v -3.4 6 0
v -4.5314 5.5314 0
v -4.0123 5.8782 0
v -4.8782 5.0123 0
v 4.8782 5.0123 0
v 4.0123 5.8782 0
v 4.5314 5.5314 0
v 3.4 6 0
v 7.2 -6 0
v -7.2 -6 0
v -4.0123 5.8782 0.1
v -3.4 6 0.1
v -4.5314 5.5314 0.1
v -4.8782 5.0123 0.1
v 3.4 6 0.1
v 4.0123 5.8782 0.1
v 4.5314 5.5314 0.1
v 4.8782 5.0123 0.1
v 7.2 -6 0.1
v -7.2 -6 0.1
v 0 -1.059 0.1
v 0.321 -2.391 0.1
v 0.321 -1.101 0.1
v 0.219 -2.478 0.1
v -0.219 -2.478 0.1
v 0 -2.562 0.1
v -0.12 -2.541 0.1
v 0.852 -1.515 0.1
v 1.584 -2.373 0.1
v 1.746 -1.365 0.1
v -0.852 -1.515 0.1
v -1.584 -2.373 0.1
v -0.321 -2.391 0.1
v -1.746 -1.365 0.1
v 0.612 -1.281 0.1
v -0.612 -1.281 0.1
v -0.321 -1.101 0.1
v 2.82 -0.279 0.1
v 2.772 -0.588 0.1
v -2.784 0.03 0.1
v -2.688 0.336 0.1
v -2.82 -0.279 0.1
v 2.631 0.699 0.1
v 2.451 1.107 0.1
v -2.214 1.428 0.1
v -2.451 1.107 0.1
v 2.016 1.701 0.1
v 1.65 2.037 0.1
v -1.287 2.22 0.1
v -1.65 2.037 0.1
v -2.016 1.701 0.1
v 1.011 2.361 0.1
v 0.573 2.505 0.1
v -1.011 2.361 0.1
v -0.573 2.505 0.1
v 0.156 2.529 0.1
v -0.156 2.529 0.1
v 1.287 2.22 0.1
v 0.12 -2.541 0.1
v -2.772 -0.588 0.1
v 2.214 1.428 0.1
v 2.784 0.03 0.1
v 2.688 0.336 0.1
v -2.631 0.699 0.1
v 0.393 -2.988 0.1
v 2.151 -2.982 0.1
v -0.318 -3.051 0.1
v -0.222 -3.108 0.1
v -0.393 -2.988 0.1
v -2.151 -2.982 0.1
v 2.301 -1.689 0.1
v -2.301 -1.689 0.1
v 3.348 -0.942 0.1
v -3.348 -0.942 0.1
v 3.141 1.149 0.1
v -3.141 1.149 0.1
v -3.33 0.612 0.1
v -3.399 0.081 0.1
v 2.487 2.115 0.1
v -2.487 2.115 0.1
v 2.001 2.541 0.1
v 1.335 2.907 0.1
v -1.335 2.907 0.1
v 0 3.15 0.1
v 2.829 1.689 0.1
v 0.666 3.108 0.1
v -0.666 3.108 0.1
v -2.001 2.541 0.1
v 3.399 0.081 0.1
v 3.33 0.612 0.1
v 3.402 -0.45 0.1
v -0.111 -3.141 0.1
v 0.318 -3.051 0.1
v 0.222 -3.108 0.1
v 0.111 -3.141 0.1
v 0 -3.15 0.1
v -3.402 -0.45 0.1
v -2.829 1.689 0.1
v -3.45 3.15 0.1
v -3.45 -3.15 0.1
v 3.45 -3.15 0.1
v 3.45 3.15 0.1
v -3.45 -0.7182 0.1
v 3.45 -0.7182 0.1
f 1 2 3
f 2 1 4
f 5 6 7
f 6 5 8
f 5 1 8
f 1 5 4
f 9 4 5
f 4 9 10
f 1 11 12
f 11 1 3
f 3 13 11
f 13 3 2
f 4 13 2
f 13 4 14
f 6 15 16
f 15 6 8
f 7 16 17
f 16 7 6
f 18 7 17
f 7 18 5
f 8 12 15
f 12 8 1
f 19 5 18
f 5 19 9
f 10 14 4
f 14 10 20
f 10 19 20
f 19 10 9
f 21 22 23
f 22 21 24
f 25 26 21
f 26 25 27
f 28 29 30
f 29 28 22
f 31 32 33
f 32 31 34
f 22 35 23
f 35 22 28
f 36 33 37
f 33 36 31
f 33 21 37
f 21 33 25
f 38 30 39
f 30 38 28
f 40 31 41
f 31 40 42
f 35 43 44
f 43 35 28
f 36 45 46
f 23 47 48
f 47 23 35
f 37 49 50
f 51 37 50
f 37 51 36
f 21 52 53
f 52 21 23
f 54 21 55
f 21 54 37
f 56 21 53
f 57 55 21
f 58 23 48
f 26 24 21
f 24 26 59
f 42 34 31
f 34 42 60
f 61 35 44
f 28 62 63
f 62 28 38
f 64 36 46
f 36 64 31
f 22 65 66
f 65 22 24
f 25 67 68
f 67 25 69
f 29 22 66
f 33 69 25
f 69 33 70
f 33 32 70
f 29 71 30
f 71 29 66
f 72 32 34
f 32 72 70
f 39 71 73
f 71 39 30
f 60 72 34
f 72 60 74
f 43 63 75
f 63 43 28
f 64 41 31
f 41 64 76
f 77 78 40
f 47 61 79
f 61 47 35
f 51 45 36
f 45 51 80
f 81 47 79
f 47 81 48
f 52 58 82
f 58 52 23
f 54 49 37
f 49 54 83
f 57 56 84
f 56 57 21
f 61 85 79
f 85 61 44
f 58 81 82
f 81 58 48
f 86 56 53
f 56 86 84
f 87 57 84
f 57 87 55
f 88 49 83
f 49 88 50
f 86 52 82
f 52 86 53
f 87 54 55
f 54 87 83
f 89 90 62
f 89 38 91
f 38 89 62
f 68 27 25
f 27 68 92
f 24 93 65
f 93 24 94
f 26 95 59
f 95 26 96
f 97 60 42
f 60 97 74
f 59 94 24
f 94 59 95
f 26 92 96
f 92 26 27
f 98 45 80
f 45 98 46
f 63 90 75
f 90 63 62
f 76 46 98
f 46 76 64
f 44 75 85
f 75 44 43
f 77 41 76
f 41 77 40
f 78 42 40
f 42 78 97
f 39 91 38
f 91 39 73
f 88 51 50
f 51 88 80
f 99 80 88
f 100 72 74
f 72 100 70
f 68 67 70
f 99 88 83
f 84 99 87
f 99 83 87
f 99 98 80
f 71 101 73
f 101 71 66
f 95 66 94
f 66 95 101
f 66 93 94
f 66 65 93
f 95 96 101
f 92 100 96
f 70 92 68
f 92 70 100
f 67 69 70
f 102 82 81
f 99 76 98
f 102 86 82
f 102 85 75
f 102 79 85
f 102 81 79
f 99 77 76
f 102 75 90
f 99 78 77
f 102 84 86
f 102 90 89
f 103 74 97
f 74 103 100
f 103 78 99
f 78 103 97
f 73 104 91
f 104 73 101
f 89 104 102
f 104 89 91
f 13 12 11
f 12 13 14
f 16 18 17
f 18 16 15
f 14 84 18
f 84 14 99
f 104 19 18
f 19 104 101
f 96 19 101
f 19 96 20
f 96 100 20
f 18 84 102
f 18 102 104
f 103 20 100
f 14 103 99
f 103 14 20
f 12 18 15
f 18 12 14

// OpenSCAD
// file: ../p/logo-shell-1971-outerbox.scad
use <../lib.scad>
function ldraw_lib__logo_shell_1971_outerbox() = [
// 0 Logo Shell 1971 Outerbox
// 0 Name: logo-shell-1971-outerbox.dat
// 0 Author: Vincent Messenet [Cheenzo]
// 0 !LDRAW_ORG Primitive UPDATE 2023-04
// 0 !LICENSE Licensed under CC BY 4.0 : see CAreadme.txt
// 
// 0 BFC CERTIFY CCW
  [0,"BFC","CERTIFY"],
  [0,"BFC","CCW"],
// 
// 0 !HISTORY 2023-06-28 [Cheenzo] Created based on 3004s60 by J. C. Tchang [tchang]
// 0 !HISTORY 2023-08-25 [OrionP] Official Update 2023-04
// 
// 
// 0 // Shell Logo 1971
// 0 // Size: x = -11.5 to 11.5 y = -10.5 to 10.5 z = 0
// 
// 3 16 -11.5 0 10.5 -8.29 0 7.05 -6.67 0 8.47
  [3,16,-11.5,0,10.5,-8.29,0,7.05,-6.67,0,8.47],
// 4 16 -7.17 0 -9.94 -7.67 0 -5.63 -11.16 0 -3.14 -11.5 0 -10.5
  [4,16,-7.17,0,-9.94,-7.67,0,-5.63,-11.16,0,-3.14,-11.5,0,-10.5],
// 3 16 -.74 0 -10.36 -1.06 0 -10.17 -7.17 0 -9.94
  [3,16,-.74,0,-10.36,-1.06,0,-10.17,-7.17,0,-9.94],
// 3 16 -11.5 0 10.5 -6.67 0 8.47 -4.45 0 9.69
  [3,16,-11.5,0,10.5,-6.67,0,8.47,-4.45,0,9.69],
// 3 16 0 0 10.5 -11.5 0 10.5 -2.22 0 10.36
  [3,16,0,0,10.5,-11.5,0,10.5,-2.22,0,10.36],
// 3 16 -11.5 0 10.5 -4.45 0 9.69 -2.22 0 10.36
  [3,16,-11.5,0,10.5,-4.45,0,9.69,-2.22,0,10.36],
// 3 16 -11.5 0 10.5 -9.43 0 5.63 -8.29 0 7.05
  [3,16,-11.5,0,10.5,-9.43,0,5.63,-8.29,0,7.05],
// 4 16 11.16 0 -3.14 7.67 0 -5.63 7.17 0 -9.94 11.5 0 -10.5
  [4,16,11.16,0,-3.14,7.67,0,-5.63,7.17,0,-9.94,11.5,0,-10.5],
// 4 16 11.5 0 -10.5 7.17 0 -9.94 .74 0 -10.36 .37 0 -10.47
  [4,16,11.5,0,-10.5,7.17,0,-9.94,.74,0,-10.36,.37,0,-10.47],
// 3 16 7.17 0 -9.94 1.06 0 -10.17 .74 0 -10.36
  [3,16,7.17,0,-9.94,1.06,0,-10.17,.74,0,-10.36],
// 3 16 7.17 0 -9.94 1.31 0 -9.96 1.06 0 -10.17
  [3,16,7.17,0,-9.94,1.31,0,-9.96,1.06,0,-10.17],
// 3 16 .37 0 -10.47 0 0 -10.5 11.5 0 -10.5
  [3,16,.37,0,-10.47,0,0,-10.5,11.5,0,-10.5],
// 3 16 -.37 0 -10.47 -11.5 0 -10.5 0 0 -10.5
  [3,16,-.37,0,-10.47,-11.5,0,-10.5,0,0,-10.5],
// 4 16 -.37 0 -10.47 -.74 0 -10.36 -7.17 0 -9.94 -11.5 0 -10.5
  [4,16,-.37,0,-10.47,-.74,0,-10.36,-7.17,0,-9.94,-11.5,0,-10.5],
// 3 16 -1.06 0 -10.17 -1.31 0 -9.96 -7.17 0 -9.94
  [3,16,-1.06,0,-10.17,-1.31,0,-9.96,-7.17,0,-9.94],
// 3 16 11.5 0 10.5 4.45 0 9.69 6.67 0 8.47
  [3,16,11.5,0,10.5,4.45,0,9.69,6.67,0,8.47],
// 3 16 -11.5 0 10.5 -10.47 0 3.83 -9.43 0 5.63
  [3,16,-11.5,0,10.5,-10.47,0,3.83,-9.43,0,5.63],
// 3 16 11.5 0 10.5 2.22 0 10.36 4.45 0 9.69
  [3,16,11.5,0,10.5,2.22,0,10.36,4.45,0,9.69],
// 3 16 11.5 0 10.5 9.43 0 5.63 10.47 0 3.83
  [3,16,11.5,0,10.5,9.43,0,5.63,10.47,0,3.83],
// 3 16 11.5 0 10.5 8.29 0 7.05 9.43 0 5.63
  [3,16,11.5,0,10.5,8.29,0,7.05,9.43,0,5.63],
// 3 16 11.5 0 10.5 6.67 0 8.47 8.29 0 7.05
  [3,16,11.5,0,10.5,6.67,0,8.47,8.29,0,7.05],
// 3 16 -11.5 0 10.5 -11.1 0 2.04 -10.47 0 3.83
  [3,16,-11.5,0,10.5,-11.1,0,2.04,-10.47,0,3.83],
// 3 16 11.5 0 10.5 10.47 0 3.83 11.1 0 2.04
  [3,16,11.5,0,10.5,10.47,0,3.83,11.1,0,2.04],
// 3 16 -11.5 0 10.5 -11.33 0 .27 -11.1 0 2.04
  [3,16,-11.5,0,10.5,-11.33,0,.27,-11.1,0,2.04],
// 3 16 11.5 0 10.5 0 0 10.5 2.22 0 10.36
  [3,16,11.5,0,10.5,0,0,10.5,2.22,0,10.36],
// 3 16 11.5 0 10.5 11.1 0 2.04 11.33 0 .27
  [3,16,11.5,0,10.5,11.1,0,2.04,11.33,0,.27],
// 4 16 -11.16 0 -3.14 -11.34 0 -1.5 -11.5 0 -2.39 -11.5 0 -10.5
  [4,16,-11.16,0,-3.14,-11.34,0,-1.5,-11.5,0,-2.39,-11.5,0,-10.5],
// 4 16 -11.34 0 -1.5 -11.33 0 .27 -11.5 0 10.5 -11.5 0 -2.39
  [4,16,-11.34,0,-1.5,-11.33,0,.27,-11.5,0,10.5,-11.5,0,-2.39],
// 4 16 11.5 0 -2.39 11.34 0 -1.5 11.16 0 -3.14 11.5 0 -10.5
  [4,16,11.5,0,-2.39,11.34,0,-1.5,11.16,0,-3.14,11.5,0,-10.5],
// 4 16 11.5 0 -2.39 11.5 0 10.5 11.33 0 .27 11.34 0 -1.5
  [4,16,11.5,0,-2.39,11.5,0,10.5,11.33,0,.27,11.34,0,-1.5],
];
module ldraw_lib__logo_shell_1971_outerbox(step=0, col=false, unit=2/5, alt=false, line=0.2, solid=!$preview)
    makepoly(ldraw_lib__logo_shell_1971_outerbox(), step=step, col=col, unit=unit, alt=alt, line=line, solid=solid);
ldraw_lib__logo_shell_1971_outerbox(line=0.2);
// file: ../p/3-16cyli.scad
use <../lib.scad>
function ldraw_lib__3_16cyli() = [
// 0 Cylinder 0.1875
// 0 Name: 3-16cyli.dat
// 0 Author: Mark Kennedy [mkennedy]
// 0 !LDRAW_ORG Primitive UPDATE 2005-01
// 0 !LICENSE Licensed under CC BY 4.0 : see CAreadme.txt
// 
// 0 BFC CERTIFY CCW
  [0,"BFC","CERTIFY"],
  [0,"BFC","CCW"],
// 
// 0 !HISTORY 2004-03-02 [PTadmin] Official Update 2004-01
// 0 !HISTORY 2004-12-11 [nielsk] Recreated using Primitive Generator, Edge lines fixed, BFC changed to CCW
// 0 !HISTORY 2005-12-28 [PTadmin] Official Update 2005-01
// 0 !HISTORY 2007-06-24 [PTadmin] Header formatted for Contributor Agreement
// 0 !HISTORY 2008-07-01 [PTadmin] Official Update 2008-01
// 
// 
// 4 16 .9239 1 .3827 .9239 0 .3827 1 0 0 1 1 0
  [4,16,.9239,1,.3827,.9239,0,.3827,1,0,0,1,1,0],
// 4 16 .7071 1 .7071 .7071 0 .7071 .9239 0 .3827 .9239 1 .3827
  [4,16,.7071,1,.7071,.7071,0,.7071,.9239,0,.3827,.9239,1,.3827],
// 4 16 .3827 1 .9239 .3827 0 .9239 .7071 0 .7071 .7071 1 .7071
  [4,16,.3827,1,.9239,.3827,0,.9239,.7071,0,.7071,.7071,1,.7071],
// 5 24 1 1 0 1 0 0 1 1 -.4142 .9239 1 .3827
  [5,24,1,1,0,1,0,0,1,1,-.4142,.9239,1,.3827],
// 5 24 .9239 1 .3827 .9239 0 .3827 1 1 0 .7071 1 .7071
  [5,24,.9239,1,.3827,.9239,0,.3827,1,1,0,.7071,1,.7071],
// 5 24 .7071 1 .7071 .7071 0 .7071 .9239 1 .3827 .3827 1 .9239
  [5,24,.7071,1,.7071,.7071,0,.7071,.9239,1,.3827,.3827,1,.9239],
// 5 24 .3827 1 .9239 .3827 0 .9239 .7071 1 .7071 0 1 1.0824
  [5,24,.3827,1,.9239,.3827,0,.9239,.7071,1,.7071,0,1,1.0824],
// 0
];
module ldraw_lib__3_16cyli(step=0, col=false, unit=2/5, alt=false, line=0.2, solid=!$preview)
    makepoly(ldraw_lib__3_16cyli(), step=step, col=col, unit=unit, alt=alt, line=line, solid=solid);
ldraw_lib__3_16cyli(line=0.2);
// file: ../p/3-16chrd.scad
use <../lib.scad>
function ldraw_lib__3_16chrd() = [
// 0 Chord 0.1875
// 0 Name: 3-16chrd.dat
// 0 Author: Niels Karsdorp [nielsk]
// 0 !LDRAW_ORG Primitive UPDATE 2009-01
// 0 !LICENSE Licensed under CC BY 4.0 : see CAreadme.txt
// 
// 0 BFC CERTIFY CCW
  [0,"BFC","CERTIFY"],
  [0,"BFC","CCW"],
// 
// 0 !HISTORY 2009-05-02 [PTadmin] Official Update 2009-01
// 
// 
// 4 16 1 0 0 0.9239 0 0.3827 0.7071 0 0.7071 0.3827 0 0.9239
  [4,16,1,0,0,0.9239,0,0.3827,0.7071,0,0.7071,0.3827,0,0.9239],
// 0
// 
];
module ldraw_lib__3_16chrd(step=0, col=false, unit=2/5, alt=false, line=0.2, solid=!$preview)
    makepoly(ldraw_lib__3_16chrd(), step=step, col=col, unit=unit, alt=alt, line=line, solid=solid);
ldraw_lib__3_16chrd(line=0.2);
// file: 004695c.scad
use <../lib.scad>
use <../p/3-16chrd.scad>
use <../p/3-16cyli.scad>
use <../p/logo-shell-1971-outerbox.scad>
use <../p/logo-shell-1971.scad>
function ldraw_lib__004695c() = [
// 0 Sticker Minifig Torso with Shell Logo 1971
// 0 Name: 004695c.dat
// 0 Author: J.C. Tchang [tchang]
// 0 !LDRAW_ORG Part UPDATE 2023-04
// 0 !LICENSE Licensed under CC BY 4.0 : see CAreadme.txt
// 
// 0 BFC CERTIFY CCW
  [0,"BFC","CERTIFY"],
  [0,"BFC","CCW"],
// 
// 0 !KEYWORDS Bricklink 377.1stk01, Brickowl 327282, Rebrickable 4695, Set 377
// 
// 0 !HISTORY 2014-06-21 [PTadmin] Official Update 2014-01
// 0 !HISTORY 2017-07-02 [cwdee] Use cylinder primitives with conditional lines
// 0 !HISTORY 2019-04-01 [MMR1988] Added missing condlines
// 0 !HISTORY 2019-06-28 [PTadmin] Official Update 2019-01
// 0 !HISTORY 2023-06-30 [Cheenzo] Made use of logo prims, added keyword
// 0 !HISTORY 2023-08-25 [OrionP] Official Update 2023-04
// 
// 
// 1 16 -8.5 0 11 0 0 -4 0 -1 0 4 0 0 3-16chrd.dat
  [1,16,-8.5,0,11,0,0,-4,0,-1,0,4,0,0, ldraw_lib__3_16chrd()],
// 1 16 8.5 0 11 0 0 4 0 -1 0 4 0 0 3-16chrd.dat
  [1,16,8.5,0,11,0,0,4,0,-1,0,4,0,0, ldraw_lib__3_16chrd()],
// 4 16 -12.1956 0 12.5308 -8.5 0 15 8.5 0 15 12.1956 0 12.5308
  [4,16,-12.1956,0,12.5308,-8.5,0,15,8.5,0,15,12.1956,0,12.5308],
// 4 16 12.1956 0 12.5308 18 0 -15 -18 0 -15 -12.1956 0 12.5308
  [4,16,12.1956,0,12.5308,18,0,-15,-18,0,-15,-12.1956,0,12.5308],
// 1 16 -8.5 0 11 0 0 -4 0 -0.25 0 4 0 0 3-16cyli.dat
  [1,16,-8.5,0,11,0,0,-4,0,-0.25,0,4,0,0, ldraw_lib__3_16cyli()],
// 1 16 8.5 0 11 0 0 4 0 -0.25 0 4 0 0 3-16cyli.dat
  [1,16,8.5,0,11,0,0,4,0,-0.25,0,4,0,0, ldraw_lib__3_16cyli()],
// 4 16 8.5 0 15 -8.5 0 15 -8.5 -0.25 15 8.5 -0.25 15
  [4,16,8.5,0,15,-8.5,0,15,-8.5,-0.25,15,8.5,-0.25,15],
// 4 16 12.1956 -0.25 12.5308 18 -0.25 -15 18 0 -15 12.1956 0 12.5308
  [4,16,12.1956,-0.25,12.5308,18,-0.25,-15,18,0,-15,12.1956,0,12.5308],
// 4 16 -12.1956 0 12.5308 -18 0 -15 -18 -0.25 -15 -12.1956 -0.25 12.5308
  [4,16,-12.1956,0,12.5308,-18,0,-15,-18,-0.25,-15,-12.1956,-0.25,12.5308],
// 4 16 18 -0.25 -15 -18 -0.25 -15 -18 0 -15 18 0 -15
  [4,16,18,-0.25,-15,-18,-0.25,-15,-18,0,-15,18,0,-15],
// 1 16 0 -.25 0 .75 0 0 0 1 0 0 0 .75 logo-shell-1971.dat
  [1,16,0,-.25,0,.75,0,0,0,1,0,0,0,.75, ldraw_lib__logo_shell_1971()],
// 1 15 0 -.25 0 .75 0 0 0 1 0 0 0 .75 logo-shell-1971-outerbox.dat
  [1,15,0,-.25,0,.75,0,0,0,1,0,0,0,.75, ldraw_lib__logo_shell_1971_outerbox()],
// 1 15 -8.5 -0.25 11 0 0 -4 0 1 0 4 0 0 3-16chrd.dat
  [1,15,-8.5,-0.25,11,0,0,-4,0,1,0,4,0,0, ldraw_lib__3_16chrd()],
// 1 15 8.5 -0.25 11 0 0 4 0 1 0 4 0 0 3-16chrd.dat
  [1,15,8.5,-0.25,11,0,0,4,0,1,0,4,0,0, ldraw_lib__3_16chrd()],
// 4 15 12.1956 -0.25 12.5308 -12.1956 -0.25 12.5308 -8.625 -0.25 7.875 0 -0.25 7.875
  [4,15,12.1956,-0.25,12.5308,-12.1956,-0.25,12.5308,-8.625,-0.25,7.875,0,-0.25,7.875],
// 4 15 8.625 -.25 -7.875 18 -.25 -15 12.1956 -.25 12.5308 8.625 -.25 -1.7925
  [4,15,8.625,-.25,-7.875,18,-.25,-15,12.1956,-.25,12.5308,8.625,-.25,-1.7925],
// 4 15 18 -0.25 -15 8.625 -0.25 -7.875 0 -0.25 -7.875 -18 -0.25 -15
  [4,15,18,-0.25,-15,8.625,-0.25,-7.875,0,-0.25,-7.875,-18,-0.25,-15],
// 3 15 0 -0.25 -7.875 -8.625 -0.25 -7.875 -18 -0.25 -15
  [3,15,0,-0.25,-7.875,-8.625,-0.25,-7.875,-18,-0.25,-15],
// 3 15 12.1956 -0.25 12.5308 0 -0.25 7.875 8.625 -0.25 7.875
  [3,15,12.1956,-0.25,12.5308,0,-0.25,7.875,8.625,-0.25,7.875],
// 3 15 12.1956 -.25 12.5308 8.625 -.25 7.875 8.625 -.25 -1.7925
  [3,15,12.1956,-.25,12.5308,8.625,-.25,7.875,8.625,-.25,-1.7925],
// 3 15 -8.625 -.25 -1.7925 -18 -.25 -15 -8.625 -.25 -7.875
  [3,15,-8.625,-.25,-1.7925,-18,-.25,-15,-8.625,-.25,-7.875],
// 4 15 -18 -.25 -15 -8.625 -.25 -1.7925 -8.625 -.25 7.875 -12.1956 -.25 12.5308
  [4,15,-18,-.25,-15,-8.625,-.25,-1.7925,-8.625,-.25,7.875,-12.1956,-.25,12.5308],
// 4 15 -8.5 -0.25 15 -12.1956 -0.25 12.5308 12.1956 -0.25 12.5308 8.5 -0.25 15
  [4,15,-8.5,-0.25,15,-12.1956,-0.25,12.5308,12.1956,-0.25,12.5308,8.5,-0.25,15],
// 5 24 12.1956 0 12.5308 12.1956 -0.25 12.5308 18 -0.25 -15 11.3284 0 13.8284
  [5,24,12.1956,0,12.5308,12.1956,-0.25,12.5308,18,-0.25,-15,11.3284,0,13.8284],
// 5 24 -12.1956 -0.25 12.5308 -12.1956 0 12.5308 -18 0 -15 -11.3284 0 13.8284
  [5,24,-12.1956,-0.25,12.5308,-12.1956,0,12.5308,-18,0,-15,-11.3284,0,13.8284],
];
module ldraw_lib__004695c(step=0, col=false, unit=2/5, alt=false, line=0.2, solid=!$preview)
    makepoly(ldraw_lib__004695c(), step=step, col=col, unit=unit, alt=alt, line=line, solid=solid);
ldraw_lib__004695c(line=0.2);
// main file
use <../lib.scad>
use <004695c.scad>
function ldraw_lib__004655b() = [
// 0 =Sticker Minifig Torso with Shell Logo 1971
// 0 Name: 004655b.dat
// 0 Author: Takeshi Takahashi [RainbowDolphin]
// 0 !LDRAW_ORG Part Alias UPDATE 2023-05
// 0 !LICENSE Licensed under CC BY 4.0 : see CAreadme.txt
// 
// 0 BFC CERTIFY CCW
  [0,"BFC","CERTIFY"],
  [0,"BFC","CCW"],
// 
// 0 !KEYWORDS Bricklink 601.1stk01, Brickowl 38037, Gas pump, Rebrickable 4655stk
// 0 !KEYWORDS set 601
// 
// 0 !HISTORY 2023-10-31 [OrionP] Official Update 2023-05
// 
// 
// 0 // Alias of 004695c
// 1 16 0 0 0 1 0 0 0 1 0 0 0 1 004695c.dat
  [1,16,0,0,0,1,0,0,0,1,0,0,0,1, ldraw_lib__004695c()],
];
module ldraw_lib__004655b(step=0, col=false, unit=2/5, alt=false, line=0.2, solid=!$preview)
    makepoly(ldraw_lib__004655b(), step=step, col=col, unit=unit, alt=alt, line=line, solid=solid);
ldraw_lib__004655b(line=0.2);
